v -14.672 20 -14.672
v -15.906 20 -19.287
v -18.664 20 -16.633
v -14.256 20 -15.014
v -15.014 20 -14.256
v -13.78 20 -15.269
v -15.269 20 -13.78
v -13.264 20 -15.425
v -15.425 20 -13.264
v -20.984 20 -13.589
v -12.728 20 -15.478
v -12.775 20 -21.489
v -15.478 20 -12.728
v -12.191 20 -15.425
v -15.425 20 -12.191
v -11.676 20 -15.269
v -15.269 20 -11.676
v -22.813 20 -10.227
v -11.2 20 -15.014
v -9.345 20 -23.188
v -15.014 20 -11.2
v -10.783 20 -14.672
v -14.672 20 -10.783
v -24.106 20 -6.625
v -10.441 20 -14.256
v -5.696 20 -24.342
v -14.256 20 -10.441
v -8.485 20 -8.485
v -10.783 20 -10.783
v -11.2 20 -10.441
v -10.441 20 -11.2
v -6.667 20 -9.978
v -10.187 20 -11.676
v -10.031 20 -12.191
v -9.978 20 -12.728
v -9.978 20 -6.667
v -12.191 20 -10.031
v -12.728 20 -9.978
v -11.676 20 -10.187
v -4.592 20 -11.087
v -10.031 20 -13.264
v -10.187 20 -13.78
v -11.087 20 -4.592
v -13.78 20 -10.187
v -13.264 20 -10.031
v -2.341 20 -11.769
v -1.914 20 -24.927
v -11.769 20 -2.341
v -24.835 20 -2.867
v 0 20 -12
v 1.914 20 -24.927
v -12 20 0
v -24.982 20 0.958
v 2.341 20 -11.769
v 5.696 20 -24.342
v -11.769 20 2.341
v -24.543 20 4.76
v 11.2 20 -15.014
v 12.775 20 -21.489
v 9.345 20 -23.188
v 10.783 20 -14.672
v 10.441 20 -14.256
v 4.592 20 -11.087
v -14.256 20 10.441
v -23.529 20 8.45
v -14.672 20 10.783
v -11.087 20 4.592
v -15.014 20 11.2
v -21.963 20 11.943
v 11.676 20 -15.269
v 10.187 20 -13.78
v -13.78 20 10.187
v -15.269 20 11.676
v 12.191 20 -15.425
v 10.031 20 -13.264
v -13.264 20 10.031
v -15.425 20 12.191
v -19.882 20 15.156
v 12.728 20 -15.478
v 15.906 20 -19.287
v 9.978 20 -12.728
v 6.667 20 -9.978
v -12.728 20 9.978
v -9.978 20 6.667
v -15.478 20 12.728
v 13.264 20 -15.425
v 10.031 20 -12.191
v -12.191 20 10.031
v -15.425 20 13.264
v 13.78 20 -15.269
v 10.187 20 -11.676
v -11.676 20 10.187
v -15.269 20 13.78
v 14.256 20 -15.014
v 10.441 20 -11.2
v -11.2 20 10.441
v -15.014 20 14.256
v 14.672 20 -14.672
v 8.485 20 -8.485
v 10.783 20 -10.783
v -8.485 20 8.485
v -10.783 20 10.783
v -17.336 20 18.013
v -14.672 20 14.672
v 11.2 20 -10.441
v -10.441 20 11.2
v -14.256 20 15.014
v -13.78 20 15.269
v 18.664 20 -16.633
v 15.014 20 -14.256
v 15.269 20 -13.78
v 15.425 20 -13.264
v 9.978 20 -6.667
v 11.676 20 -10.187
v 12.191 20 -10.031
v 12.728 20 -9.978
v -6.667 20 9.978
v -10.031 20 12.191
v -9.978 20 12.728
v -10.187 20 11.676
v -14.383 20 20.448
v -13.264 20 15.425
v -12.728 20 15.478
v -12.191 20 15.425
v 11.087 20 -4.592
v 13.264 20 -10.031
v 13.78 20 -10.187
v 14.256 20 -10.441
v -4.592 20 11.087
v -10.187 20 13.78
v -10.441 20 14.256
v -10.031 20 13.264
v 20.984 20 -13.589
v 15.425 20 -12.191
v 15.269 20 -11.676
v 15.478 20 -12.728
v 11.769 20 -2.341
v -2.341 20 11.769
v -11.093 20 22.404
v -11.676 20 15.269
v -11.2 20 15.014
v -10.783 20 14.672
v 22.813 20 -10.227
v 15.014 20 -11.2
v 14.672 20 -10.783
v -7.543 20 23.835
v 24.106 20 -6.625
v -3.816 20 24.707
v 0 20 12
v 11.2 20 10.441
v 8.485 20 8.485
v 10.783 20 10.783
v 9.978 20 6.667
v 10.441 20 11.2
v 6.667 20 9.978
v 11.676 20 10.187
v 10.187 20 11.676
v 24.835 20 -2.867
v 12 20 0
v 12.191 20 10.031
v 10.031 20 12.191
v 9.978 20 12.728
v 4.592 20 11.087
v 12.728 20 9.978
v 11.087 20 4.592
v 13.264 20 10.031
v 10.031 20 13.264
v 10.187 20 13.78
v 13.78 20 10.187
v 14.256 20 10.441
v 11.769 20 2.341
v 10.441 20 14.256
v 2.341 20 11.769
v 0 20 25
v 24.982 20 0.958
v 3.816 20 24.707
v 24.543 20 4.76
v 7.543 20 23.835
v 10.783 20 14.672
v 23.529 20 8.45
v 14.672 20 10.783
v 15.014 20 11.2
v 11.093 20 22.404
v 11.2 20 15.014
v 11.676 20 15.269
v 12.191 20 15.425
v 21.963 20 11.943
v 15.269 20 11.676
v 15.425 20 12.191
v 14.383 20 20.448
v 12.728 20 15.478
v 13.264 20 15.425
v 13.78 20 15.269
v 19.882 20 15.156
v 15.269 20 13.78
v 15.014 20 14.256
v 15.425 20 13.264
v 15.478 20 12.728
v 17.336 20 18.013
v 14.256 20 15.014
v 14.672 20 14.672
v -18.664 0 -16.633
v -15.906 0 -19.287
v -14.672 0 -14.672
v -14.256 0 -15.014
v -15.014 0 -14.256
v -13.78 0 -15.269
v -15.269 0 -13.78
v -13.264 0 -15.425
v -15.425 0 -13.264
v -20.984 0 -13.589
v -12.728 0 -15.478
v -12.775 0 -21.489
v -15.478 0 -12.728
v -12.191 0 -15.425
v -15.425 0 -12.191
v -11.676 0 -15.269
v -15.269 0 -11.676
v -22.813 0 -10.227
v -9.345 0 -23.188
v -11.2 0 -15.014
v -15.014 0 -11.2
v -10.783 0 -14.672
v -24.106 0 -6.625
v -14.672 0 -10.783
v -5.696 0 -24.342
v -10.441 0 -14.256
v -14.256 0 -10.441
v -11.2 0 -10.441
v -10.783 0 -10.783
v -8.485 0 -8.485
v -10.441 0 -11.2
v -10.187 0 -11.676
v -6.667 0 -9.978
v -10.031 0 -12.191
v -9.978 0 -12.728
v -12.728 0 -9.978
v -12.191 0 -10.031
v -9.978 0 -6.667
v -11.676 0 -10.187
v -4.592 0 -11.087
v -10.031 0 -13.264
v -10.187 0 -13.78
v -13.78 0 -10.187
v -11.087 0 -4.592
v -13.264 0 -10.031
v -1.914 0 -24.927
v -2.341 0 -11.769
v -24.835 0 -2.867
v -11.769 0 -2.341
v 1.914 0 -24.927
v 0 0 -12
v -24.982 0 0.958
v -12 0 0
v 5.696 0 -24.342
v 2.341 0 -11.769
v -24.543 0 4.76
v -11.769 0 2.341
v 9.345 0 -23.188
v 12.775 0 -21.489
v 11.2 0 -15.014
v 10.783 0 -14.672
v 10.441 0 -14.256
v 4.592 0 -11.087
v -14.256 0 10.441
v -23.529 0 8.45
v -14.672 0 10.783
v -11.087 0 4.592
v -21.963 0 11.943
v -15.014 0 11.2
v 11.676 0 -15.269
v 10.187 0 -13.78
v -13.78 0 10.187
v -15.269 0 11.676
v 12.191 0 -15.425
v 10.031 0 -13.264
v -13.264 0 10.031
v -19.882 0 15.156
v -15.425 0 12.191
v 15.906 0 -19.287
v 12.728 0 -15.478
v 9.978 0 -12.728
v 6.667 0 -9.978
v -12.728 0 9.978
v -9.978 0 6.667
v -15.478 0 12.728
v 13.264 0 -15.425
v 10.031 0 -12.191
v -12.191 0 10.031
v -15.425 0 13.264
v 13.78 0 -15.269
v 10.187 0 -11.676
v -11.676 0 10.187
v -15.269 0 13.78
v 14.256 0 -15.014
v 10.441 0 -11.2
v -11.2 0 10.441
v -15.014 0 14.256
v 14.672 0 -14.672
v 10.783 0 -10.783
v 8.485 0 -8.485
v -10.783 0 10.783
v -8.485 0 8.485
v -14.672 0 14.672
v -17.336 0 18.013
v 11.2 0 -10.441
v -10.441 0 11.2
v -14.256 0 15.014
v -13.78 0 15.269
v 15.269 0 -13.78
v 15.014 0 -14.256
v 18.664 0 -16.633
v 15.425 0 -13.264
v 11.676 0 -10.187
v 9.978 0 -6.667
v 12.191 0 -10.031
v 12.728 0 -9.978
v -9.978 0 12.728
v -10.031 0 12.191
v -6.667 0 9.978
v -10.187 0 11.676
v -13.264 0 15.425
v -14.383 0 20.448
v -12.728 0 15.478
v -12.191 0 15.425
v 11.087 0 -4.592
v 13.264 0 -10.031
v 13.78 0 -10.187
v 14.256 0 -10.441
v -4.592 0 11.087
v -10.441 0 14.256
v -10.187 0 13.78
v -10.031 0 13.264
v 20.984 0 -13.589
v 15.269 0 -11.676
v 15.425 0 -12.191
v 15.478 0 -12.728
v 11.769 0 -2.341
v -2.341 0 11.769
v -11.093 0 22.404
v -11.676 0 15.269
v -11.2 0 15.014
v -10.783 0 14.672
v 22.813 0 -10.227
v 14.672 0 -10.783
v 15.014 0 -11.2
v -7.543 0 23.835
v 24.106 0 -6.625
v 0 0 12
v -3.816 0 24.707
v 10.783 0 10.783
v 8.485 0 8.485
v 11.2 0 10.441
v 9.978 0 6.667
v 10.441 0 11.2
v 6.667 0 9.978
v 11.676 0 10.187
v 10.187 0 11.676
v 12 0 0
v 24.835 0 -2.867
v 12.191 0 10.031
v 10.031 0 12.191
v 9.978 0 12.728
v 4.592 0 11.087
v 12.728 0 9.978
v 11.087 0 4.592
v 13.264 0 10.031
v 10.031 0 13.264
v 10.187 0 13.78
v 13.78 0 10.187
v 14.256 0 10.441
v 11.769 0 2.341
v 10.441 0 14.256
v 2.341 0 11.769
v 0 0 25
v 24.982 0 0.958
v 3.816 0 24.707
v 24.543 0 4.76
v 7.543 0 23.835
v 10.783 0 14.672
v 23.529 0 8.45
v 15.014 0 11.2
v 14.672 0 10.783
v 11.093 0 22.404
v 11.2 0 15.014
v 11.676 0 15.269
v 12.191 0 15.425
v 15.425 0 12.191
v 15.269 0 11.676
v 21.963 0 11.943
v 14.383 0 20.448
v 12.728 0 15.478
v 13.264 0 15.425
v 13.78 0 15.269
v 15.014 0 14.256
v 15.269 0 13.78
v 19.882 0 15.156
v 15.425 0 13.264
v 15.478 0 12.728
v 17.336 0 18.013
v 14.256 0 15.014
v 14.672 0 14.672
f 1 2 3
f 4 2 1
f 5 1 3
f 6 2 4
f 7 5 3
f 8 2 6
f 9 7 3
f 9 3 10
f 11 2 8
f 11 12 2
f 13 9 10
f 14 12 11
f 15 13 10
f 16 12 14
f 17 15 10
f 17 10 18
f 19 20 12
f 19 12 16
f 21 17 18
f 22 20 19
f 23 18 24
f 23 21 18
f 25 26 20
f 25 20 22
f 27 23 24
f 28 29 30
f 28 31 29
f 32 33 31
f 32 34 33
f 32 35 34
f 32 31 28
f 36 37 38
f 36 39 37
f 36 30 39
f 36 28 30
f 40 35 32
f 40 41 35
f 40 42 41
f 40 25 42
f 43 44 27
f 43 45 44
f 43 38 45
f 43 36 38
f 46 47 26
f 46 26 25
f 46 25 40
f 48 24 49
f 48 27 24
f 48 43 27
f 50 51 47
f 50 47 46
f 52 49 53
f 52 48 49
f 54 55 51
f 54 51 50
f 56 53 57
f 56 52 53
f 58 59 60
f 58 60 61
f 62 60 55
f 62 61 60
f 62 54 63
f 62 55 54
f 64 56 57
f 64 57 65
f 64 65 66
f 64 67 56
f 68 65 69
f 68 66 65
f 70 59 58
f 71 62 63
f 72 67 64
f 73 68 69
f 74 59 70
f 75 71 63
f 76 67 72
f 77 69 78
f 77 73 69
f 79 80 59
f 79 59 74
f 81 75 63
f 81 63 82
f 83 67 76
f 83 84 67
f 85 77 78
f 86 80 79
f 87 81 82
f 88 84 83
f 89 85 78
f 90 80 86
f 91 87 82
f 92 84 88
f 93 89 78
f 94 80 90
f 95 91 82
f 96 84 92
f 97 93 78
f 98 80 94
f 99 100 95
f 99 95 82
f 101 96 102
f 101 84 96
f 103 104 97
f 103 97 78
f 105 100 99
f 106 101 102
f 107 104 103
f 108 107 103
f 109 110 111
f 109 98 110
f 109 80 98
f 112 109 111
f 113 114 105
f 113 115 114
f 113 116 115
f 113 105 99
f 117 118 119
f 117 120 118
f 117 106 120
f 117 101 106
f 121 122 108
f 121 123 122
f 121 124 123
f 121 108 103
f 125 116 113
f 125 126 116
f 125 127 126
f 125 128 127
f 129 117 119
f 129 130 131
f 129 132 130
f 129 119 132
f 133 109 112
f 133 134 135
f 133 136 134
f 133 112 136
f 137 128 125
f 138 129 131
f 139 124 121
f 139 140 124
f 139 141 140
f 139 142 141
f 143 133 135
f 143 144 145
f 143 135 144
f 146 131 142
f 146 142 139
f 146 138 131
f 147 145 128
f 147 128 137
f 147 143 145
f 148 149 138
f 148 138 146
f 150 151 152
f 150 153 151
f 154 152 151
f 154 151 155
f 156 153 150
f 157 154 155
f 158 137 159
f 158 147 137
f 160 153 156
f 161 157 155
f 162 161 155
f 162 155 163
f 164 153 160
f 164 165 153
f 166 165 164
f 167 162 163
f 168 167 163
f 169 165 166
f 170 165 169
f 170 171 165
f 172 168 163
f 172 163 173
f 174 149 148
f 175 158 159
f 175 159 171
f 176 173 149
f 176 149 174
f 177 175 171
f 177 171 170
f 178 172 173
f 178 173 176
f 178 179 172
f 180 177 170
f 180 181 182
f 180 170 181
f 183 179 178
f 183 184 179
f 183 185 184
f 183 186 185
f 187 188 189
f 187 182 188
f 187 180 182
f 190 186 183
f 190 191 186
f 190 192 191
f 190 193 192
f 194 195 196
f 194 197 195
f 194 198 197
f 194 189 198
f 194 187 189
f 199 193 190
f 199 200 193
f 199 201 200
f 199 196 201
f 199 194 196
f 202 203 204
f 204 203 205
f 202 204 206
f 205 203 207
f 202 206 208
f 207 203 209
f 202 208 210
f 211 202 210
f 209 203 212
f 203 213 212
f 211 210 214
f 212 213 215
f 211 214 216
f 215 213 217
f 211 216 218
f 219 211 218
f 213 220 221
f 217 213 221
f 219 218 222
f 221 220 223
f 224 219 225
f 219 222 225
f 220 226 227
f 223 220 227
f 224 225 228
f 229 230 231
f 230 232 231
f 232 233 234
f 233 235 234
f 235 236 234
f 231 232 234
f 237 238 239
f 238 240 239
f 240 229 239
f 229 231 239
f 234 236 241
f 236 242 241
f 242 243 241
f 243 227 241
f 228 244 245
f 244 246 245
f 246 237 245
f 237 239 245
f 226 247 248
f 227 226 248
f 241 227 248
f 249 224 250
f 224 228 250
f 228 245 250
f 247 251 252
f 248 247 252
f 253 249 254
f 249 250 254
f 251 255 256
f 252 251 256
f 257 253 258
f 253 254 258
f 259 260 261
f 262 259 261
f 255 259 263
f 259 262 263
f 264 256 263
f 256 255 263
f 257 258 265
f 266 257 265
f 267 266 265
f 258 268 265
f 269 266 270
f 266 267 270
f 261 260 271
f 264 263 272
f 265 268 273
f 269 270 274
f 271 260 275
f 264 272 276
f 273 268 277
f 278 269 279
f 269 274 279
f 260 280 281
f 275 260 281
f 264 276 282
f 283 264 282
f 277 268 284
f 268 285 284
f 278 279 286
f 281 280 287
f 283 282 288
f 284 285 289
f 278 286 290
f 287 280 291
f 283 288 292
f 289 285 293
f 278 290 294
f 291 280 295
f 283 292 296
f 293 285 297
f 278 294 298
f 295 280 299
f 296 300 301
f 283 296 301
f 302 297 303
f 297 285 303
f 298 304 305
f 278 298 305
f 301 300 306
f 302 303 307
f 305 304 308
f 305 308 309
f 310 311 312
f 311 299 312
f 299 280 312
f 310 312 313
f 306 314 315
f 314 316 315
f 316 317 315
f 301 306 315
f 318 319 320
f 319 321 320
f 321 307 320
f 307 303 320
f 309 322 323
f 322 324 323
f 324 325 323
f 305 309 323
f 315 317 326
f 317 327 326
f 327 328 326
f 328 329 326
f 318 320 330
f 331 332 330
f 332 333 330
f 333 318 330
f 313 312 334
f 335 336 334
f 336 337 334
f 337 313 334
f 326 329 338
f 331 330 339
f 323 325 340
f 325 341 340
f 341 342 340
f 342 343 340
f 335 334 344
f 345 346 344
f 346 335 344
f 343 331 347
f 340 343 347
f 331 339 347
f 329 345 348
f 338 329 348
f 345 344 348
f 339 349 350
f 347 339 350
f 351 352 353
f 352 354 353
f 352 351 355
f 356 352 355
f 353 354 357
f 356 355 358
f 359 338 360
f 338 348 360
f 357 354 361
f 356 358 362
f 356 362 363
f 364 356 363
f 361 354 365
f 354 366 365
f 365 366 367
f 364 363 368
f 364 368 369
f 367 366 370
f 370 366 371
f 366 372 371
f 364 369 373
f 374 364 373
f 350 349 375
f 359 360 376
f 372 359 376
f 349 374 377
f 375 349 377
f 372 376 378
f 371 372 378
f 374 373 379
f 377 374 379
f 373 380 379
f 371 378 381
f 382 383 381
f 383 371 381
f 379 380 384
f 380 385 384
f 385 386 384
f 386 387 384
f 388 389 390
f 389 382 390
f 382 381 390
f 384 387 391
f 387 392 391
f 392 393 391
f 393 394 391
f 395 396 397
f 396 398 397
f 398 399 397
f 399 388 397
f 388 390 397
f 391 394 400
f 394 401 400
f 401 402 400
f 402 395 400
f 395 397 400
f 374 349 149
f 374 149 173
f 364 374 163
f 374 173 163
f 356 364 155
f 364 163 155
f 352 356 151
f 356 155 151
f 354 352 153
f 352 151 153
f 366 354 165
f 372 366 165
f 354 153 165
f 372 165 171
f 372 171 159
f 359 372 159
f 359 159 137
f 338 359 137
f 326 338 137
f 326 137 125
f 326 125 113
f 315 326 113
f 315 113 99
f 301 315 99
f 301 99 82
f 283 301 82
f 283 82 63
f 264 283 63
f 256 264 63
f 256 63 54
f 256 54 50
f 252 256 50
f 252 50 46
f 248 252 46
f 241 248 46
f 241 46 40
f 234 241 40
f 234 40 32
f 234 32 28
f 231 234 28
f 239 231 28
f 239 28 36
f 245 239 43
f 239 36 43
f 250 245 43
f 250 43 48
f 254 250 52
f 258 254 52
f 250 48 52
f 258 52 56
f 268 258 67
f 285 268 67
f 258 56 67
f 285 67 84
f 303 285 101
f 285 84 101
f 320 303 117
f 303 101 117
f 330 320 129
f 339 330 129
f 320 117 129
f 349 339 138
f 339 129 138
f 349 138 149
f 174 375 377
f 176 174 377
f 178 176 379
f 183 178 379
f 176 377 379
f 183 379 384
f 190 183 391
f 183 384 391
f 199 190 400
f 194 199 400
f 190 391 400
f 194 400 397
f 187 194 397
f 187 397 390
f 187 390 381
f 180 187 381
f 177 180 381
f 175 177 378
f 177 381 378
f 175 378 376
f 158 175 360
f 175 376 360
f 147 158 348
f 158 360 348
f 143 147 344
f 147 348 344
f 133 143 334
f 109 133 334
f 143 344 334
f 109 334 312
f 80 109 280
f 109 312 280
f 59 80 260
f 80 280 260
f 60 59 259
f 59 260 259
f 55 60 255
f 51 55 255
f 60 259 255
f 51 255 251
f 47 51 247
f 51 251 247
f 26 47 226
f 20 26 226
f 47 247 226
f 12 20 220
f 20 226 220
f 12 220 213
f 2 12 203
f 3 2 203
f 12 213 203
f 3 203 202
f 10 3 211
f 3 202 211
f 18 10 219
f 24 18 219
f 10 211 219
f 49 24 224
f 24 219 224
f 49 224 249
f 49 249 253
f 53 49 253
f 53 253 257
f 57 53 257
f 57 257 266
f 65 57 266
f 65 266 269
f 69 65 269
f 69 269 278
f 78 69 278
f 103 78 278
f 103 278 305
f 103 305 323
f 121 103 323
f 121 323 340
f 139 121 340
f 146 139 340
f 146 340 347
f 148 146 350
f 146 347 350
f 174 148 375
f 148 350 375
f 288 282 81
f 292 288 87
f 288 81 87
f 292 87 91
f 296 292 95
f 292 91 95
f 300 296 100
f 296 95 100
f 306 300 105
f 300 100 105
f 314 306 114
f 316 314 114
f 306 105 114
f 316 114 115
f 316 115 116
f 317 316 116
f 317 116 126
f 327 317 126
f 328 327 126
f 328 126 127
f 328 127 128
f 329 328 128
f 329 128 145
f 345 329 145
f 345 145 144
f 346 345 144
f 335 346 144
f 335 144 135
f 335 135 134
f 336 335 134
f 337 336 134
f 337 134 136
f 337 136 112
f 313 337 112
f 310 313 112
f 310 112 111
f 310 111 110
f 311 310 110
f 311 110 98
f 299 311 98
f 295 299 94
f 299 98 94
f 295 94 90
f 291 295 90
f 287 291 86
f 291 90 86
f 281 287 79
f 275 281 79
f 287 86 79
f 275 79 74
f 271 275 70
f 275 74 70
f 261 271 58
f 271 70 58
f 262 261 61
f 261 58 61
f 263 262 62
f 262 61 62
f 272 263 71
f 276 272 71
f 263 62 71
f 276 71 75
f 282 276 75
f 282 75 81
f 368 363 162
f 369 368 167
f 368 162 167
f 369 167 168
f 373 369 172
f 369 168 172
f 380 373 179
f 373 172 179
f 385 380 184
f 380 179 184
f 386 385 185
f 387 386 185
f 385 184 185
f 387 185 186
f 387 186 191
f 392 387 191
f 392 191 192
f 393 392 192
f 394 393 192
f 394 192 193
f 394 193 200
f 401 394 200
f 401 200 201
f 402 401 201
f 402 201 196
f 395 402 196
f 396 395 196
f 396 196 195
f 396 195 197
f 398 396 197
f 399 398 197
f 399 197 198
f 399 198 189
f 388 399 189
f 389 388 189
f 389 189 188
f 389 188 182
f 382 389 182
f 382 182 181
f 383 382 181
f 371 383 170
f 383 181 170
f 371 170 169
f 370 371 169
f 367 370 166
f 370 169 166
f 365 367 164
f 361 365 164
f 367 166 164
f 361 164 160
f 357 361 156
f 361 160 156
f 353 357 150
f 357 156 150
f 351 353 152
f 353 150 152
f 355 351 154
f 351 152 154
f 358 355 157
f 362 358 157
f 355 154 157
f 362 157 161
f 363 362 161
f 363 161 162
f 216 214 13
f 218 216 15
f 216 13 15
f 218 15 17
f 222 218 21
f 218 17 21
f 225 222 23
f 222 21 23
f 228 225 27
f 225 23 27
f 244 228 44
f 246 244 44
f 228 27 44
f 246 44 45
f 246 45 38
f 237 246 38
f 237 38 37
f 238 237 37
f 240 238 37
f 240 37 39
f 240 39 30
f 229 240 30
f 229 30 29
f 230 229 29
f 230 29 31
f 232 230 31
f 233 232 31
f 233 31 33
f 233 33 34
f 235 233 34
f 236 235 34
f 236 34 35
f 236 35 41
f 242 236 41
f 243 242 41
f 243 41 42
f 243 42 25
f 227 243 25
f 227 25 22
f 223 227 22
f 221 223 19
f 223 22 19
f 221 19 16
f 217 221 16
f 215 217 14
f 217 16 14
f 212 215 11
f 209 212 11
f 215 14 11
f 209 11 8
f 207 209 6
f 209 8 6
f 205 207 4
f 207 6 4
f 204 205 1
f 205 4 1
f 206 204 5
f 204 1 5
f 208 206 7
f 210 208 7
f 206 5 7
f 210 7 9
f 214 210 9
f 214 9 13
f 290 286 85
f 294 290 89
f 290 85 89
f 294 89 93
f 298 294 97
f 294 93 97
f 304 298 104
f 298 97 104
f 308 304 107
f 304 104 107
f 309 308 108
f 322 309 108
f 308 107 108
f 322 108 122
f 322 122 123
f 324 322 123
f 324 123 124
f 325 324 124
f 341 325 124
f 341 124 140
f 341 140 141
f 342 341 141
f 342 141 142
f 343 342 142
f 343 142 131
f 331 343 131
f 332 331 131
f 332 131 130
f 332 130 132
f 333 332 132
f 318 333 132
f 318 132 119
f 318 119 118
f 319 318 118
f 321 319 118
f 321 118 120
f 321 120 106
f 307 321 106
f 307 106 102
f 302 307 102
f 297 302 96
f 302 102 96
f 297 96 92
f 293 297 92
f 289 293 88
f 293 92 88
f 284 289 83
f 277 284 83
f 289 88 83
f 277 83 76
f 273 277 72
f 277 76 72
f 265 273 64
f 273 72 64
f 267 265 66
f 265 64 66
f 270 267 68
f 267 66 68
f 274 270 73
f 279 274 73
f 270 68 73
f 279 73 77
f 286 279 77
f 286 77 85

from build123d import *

# Parameters (mm, degrees)
SKETCH_1_R          = 25
EXTRUDE_1_DEPTH     = 20
SKETCH_2_R          = 12
CUT_EXTRUDE_1_DEPTH = 41.620192023
HOLE_WIZARD_M5_1_D  = 5.5


with BuildPart() as part:
    # ｽｹｯﾁ1 → ﾎﾞｽ - 押し出し1 (new body)
    with BuildSketch(Plane(origin=(0, 0, 0), x_dir=(1, 0, 0), z_dir=(0, 1, 0))):
        with Locations(Location((0, 0, 0), (0, 0, 270))):
            Circle(SKETCH_1_R)
    extrude(amount=EXTRUDE_1_DEPTH)

    # ｽｹｯﾁ2 → ｶｯﾄ - 押し出し1 (cut, through all)
    with BuildSketch(Plane(origin=(0, 20, 0), x_dir=(1, 0, 0), z_dir=(0, 1, 0))):
        with Locations(Location((0, 0, 0), (0, 0, 270))):
            Circle(SKETCH_2_R)
    extrude(amount=-CUT_EXTRUDE_1_DEPTH, mode=Mode.SUBTRACT)

    # M5 すきま穴1 (through all)
    with Locations(Plane.XZ):
        with Locations((-12.727922061, 12.727922061), (12.727922061, -12.727922061), (-12.727922061, -12.727922061), (12.727922061, 12.727922061)):
            Hole(HOLE_WIZARD_M5_1_D / 2)


solid = part.part
